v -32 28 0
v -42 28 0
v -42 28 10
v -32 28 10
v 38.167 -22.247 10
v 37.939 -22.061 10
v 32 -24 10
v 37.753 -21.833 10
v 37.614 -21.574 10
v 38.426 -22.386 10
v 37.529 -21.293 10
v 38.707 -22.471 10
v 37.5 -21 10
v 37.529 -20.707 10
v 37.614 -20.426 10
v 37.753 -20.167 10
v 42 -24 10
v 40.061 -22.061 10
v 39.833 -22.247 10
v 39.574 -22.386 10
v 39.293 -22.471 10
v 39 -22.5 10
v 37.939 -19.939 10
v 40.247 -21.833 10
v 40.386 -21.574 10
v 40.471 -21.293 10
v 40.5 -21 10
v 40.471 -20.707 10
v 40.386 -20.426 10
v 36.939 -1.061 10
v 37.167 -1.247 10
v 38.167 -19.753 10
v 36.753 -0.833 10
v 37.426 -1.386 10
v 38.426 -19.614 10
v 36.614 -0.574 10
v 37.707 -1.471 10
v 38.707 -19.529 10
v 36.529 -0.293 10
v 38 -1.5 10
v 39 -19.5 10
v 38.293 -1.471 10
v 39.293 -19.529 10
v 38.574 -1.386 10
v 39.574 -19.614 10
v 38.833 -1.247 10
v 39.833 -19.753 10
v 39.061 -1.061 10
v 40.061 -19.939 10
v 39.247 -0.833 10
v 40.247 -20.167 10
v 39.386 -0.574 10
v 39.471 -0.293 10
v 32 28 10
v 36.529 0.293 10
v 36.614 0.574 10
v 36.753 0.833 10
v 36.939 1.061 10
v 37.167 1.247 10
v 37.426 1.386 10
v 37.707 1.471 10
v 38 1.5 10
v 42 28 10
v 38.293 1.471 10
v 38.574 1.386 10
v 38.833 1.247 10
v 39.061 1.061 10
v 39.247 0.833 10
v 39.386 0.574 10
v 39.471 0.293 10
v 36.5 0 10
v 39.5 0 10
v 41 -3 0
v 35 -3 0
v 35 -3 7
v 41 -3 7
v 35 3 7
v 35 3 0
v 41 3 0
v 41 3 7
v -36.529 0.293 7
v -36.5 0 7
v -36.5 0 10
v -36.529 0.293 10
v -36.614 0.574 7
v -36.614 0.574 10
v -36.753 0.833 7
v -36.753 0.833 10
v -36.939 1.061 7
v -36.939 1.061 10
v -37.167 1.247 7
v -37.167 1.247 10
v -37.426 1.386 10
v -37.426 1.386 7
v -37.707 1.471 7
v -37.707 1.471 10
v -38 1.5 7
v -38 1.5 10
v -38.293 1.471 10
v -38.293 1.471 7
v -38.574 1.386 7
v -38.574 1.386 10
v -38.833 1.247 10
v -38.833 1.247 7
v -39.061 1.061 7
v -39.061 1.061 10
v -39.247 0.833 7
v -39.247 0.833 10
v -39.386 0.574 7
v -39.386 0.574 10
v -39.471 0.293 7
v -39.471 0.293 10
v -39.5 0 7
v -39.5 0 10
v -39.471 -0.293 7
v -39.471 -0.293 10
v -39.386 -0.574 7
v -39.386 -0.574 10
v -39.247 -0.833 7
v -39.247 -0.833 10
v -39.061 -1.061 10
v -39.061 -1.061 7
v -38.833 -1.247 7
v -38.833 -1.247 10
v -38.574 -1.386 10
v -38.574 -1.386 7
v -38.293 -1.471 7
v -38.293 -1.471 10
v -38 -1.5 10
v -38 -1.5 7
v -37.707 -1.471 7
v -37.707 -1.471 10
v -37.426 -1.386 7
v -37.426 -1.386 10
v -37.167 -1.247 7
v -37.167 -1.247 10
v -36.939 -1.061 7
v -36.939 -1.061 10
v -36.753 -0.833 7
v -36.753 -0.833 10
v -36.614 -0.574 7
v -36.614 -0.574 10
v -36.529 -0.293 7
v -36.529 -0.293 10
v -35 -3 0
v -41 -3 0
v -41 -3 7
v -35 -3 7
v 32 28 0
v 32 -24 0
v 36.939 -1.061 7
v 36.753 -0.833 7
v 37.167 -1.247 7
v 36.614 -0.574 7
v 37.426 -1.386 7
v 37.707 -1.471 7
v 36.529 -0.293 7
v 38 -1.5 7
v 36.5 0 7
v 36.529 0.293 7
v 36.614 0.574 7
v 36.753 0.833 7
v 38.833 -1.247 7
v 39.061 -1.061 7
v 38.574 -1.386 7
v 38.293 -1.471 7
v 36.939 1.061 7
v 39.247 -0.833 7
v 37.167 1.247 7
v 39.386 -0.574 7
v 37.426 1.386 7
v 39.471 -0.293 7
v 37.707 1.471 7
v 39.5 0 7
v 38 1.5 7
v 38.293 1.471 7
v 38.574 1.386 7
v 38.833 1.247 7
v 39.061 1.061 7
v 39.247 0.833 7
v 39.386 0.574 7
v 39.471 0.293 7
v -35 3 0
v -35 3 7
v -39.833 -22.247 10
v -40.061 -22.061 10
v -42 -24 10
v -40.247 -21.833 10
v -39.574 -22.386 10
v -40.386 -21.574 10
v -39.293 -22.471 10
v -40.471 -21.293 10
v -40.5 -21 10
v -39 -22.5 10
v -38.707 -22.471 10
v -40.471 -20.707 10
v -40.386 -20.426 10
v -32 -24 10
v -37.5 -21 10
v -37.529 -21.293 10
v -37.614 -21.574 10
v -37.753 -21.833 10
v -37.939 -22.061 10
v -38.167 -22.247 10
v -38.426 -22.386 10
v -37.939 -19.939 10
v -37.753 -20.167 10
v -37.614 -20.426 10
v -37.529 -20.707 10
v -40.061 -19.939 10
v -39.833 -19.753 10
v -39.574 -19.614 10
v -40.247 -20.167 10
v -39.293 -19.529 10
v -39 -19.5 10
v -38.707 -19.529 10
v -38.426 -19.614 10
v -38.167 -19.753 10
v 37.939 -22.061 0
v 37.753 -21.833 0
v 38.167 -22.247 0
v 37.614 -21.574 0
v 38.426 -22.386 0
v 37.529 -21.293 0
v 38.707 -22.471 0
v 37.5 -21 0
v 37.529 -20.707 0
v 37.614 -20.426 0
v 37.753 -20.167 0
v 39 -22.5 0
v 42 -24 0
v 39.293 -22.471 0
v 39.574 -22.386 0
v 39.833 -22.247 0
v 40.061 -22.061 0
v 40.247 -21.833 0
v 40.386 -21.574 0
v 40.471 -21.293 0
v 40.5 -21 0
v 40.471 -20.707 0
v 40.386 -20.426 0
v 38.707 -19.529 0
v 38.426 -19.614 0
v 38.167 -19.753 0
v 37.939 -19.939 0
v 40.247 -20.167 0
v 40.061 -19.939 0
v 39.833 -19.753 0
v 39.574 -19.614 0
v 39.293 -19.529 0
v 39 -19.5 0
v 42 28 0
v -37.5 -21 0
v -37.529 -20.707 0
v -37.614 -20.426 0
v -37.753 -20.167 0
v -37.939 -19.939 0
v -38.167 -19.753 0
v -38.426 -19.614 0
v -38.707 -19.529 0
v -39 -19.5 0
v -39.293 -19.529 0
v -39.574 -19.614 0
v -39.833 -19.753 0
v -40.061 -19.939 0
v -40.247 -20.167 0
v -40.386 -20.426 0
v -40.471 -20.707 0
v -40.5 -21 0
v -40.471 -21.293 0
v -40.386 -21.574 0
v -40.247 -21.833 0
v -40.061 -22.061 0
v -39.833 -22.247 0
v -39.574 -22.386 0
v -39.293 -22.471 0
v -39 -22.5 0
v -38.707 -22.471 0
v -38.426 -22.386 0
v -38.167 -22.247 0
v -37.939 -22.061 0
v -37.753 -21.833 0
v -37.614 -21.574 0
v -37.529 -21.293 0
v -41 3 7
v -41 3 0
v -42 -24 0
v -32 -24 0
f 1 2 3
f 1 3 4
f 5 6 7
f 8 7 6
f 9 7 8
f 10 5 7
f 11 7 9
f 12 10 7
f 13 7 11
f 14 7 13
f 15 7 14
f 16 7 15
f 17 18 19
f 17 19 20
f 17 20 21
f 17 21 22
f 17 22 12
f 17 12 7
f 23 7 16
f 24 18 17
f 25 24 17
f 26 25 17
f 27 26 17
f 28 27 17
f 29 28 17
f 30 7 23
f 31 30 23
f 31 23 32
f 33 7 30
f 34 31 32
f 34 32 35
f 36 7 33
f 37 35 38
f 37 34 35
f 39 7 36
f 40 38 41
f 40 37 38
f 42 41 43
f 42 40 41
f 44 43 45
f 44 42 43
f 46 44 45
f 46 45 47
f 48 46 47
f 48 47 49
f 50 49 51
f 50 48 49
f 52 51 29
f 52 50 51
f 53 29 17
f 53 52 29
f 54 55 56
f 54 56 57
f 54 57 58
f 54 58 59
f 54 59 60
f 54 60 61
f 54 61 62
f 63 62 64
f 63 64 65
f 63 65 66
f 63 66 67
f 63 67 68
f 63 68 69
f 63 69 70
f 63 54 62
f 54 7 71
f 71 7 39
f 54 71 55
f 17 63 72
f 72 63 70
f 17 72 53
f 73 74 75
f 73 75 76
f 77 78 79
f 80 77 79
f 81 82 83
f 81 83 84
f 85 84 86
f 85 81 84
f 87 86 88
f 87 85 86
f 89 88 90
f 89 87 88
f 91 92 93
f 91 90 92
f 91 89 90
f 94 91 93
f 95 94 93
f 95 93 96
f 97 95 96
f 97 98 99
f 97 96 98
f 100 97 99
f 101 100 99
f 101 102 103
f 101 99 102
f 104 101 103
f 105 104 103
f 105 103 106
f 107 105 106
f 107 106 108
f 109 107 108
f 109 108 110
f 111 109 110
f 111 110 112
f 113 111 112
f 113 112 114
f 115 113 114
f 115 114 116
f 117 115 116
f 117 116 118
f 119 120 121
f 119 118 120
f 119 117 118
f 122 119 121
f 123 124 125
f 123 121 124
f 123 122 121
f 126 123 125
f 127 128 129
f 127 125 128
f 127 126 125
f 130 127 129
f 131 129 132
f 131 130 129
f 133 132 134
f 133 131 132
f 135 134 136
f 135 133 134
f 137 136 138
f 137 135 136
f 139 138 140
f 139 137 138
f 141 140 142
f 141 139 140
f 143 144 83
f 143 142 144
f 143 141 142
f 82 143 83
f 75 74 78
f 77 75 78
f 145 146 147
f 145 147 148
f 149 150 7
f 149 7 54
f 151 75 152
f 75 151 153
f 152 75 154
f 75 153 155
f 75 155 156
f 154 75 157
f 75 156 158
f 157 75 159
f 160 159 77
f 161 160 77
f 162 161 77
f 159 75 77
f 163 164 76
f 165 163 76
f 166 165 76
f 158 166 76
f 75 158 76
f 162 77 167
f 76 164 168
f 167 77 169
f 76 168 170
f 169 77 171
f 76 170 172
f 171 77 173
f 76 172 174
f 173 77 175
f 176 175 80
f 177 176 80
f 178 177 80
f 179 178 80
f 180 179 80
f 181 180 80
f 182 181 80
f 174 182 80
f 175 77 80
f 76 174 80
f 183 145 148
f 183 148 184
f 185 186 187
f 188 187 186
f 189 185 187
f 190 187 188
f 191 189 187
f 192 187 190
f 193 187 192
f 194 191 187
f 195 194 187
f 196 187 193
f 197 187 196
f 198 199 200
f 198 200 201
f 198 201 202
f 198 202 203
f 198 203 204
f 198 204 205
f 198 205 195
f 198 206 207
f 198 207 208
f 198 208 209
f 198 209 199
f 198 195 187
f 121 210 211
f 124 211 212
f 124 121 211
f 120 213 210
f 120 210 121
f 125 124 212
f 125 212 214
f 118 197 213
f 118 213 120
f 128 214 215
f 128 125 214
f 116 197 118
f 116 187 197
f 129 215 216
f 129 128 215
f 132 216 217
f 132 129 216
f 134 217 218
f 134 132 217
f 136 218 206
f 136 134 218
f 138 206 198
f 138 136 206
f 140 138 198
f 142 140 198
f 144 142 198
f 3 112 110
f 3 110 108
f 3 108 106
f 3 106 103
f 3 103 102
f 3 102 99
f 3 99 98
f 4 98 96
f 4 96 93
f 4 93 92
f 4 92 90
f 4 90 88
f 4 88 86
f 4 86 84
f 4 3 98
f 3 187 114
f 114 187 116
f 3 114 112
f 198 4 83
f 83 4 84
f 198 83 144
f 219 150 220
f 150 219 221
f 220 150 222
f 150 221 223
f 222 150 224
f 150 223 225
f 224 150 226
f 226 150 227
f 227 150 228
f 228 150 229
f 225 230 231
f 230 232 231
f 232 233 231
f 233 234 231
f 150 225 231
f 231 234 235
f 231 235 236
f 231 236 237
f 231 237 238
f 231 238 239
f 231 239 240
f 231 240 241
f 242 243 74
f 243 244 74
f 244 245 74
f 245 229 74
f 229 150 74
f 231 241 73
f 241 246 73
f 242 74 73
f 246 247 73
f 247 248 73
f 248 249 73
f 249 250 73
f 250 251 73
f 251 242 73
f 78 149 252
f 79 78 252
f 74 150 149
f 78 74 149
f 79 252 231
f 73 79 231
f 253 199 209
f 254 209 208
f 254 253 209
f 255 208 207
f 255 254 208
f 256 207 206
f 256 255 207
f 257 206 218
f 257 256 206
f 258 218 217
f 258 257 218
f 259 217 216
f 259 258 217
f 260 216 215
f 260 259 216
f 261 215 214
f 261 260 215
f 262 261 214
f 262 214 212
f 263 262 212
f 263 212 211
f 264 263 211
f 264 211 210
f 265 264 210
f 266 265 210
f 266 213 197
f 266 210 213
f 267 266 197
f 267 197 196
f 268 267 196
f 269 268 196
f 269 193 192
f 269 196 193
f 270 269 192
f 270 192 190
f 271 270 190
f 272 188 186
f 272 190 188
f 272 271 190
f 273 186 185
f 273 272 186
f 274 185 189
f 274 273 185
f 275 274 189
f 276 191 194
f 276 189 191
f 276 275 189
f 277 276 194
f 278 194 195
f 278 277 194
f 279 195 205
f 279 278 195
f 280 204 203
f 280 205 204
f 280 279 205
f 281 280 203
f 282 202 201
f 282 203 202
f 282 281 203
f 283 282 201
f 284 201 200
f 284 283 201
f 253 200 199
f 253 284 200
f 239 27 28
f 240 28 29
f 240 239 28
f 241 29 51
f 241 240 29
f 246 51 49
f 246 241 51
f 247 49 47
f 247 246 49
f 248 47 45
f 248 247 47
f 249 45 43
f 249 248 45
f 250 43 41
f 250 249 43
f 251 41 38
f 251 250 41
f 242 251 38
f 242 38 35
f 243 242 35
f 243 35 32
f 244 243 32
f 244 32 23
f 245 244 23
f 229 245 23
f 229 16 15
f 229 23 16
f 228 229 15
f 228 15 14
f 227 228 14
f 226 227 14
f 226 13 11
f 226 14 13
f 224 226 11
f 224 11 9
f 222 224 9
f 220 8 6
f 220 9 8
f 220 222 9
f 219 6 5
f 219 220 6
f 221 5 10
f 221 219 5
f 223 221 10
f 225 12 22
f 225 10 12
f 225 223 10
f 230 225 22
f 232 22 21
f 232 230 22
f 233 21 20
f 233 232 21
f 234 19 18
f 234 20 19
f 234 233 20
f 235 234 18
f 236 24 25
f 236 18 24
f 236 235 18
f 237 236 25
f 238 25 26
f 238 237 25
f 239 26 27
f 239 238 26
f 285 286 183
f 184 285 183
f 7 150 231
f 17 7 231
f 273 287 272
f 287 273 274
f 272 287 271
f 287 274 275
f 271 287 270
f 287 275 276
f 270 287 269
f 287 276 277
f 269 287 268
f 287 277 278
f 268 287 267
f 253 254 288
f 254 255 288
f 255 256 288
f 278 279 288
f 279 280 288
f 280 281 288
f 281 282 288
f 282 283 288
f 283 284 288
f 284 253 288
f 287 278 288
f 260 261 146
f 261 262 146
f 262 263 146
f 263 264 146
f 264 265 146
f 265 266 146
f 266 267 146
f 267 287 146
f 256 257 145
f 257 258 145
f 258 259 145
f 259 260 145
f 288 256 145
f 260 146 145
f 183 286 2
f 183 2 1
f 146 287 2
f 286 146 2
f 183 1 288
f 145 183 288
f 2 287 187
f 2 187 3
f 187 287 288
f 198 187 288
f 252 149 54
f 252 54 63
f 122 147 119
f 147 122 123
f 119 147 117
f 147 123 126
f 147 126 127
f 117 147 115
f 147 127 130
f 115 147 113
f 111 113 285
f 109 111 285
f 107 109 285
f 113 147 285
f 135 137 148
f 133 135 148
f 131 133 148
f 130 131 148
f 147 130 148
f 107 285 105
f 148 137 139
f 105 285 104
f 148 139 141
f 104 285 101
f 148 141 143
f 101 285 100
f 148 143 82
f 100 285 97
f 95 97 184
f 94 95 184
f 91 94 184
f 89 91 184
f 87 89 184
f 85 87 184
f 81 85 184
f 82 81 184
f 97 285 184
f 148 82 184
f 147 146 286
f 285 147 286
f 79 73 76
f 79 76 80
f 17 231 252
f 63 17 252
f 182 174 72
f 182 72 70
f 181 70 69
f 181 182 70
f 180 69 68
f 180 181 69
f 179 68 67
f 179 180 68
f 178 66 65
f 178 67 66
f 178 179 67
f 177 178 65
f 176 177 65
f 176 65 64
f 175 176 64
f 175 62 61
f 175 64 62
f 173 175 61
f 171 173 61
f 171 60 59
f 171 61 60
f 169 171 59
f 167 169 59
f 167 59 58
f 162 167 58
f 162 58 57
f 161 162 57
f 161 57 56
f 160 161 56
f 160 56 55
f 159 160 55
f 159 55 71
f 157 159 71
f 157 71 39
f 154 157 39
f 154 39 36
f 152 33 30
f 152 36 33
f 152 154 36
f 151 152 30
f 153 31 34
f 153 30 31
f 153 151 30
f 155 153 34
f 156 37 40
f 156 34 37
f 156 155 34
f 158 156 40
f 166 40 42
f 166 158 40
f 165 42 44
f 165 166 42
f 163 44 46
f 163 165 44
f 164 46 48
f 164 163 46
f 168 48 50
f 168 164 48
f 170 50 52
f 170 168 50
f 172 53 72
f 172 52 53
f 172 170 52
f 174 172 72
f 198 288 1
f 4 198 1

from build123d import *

# Parameters (mm, degrees)
BOX239_W           = 6
BOX239_H           = 6
BOX239_DEPTH       = 64
BOX238_W           = 6
BOX238_H           = 6
BOX238_DEPTH       = 64
CYLINDER1263_R     = 1.5
CYLINDER1263_DEPTH = 32
CYLINDER1262_R     = 1.5
CYLINDER1262_DEPTH = 32
CYLINDER1261_R     = 1.5
CYLINDER1261_DEPTH = 100
CYLINDER1260_R     = 1.5
CYLINDER1260_DEPTH = 100
CYLINDER586_R      = 1.5
CYLINDER586_DEPTH  = 100
CYLINDER585_R      = 1.5
CYLINDER585_DEPTH  = 100
BOX141_W           = 10
BOX141_H           = 52
BOX141_DEPTH       = 10
BOX140_W           = 10
BOX140_H           = 52
BOX140_DEPTH       = 10


with BuildPart() as krychle239:
    # Box239 → Box239 (new body)
    with BuildSketch(Plane(origin=(87, -3, -93), x_dir=(1, 0, 0), z_dir=(0, 0, 1))):
        with Locations((3, 3)):
            Rectangle(BOX239_W, BOX239_H)
    extrude(amount=BOX239_DEPTH)


with BuildPart() as compound646:
    # Box238 → Box238 (new body)
    with BuildSketch(Plane(origin=(11, -3, -93), x_dir=(1, 0, 0), z_dir=(0, 0, 1))):
        with Locations((3, 3)):
            Rectangle(BOX238_W, BOX238_H)
    extrude(amount=BOX238_DEPTH)

    # Compound646: union Krychle239
    add(krychle239.part)


with BuildPart() as compound646_1:
    # Compound646 placement: moved
    add(compound646.part.moved(Location((-52, 0, 36))))


with BuildPart() as v_lec1263:
    # Cylinder1263 → Cylinder1263 (new body)
    with BuildSketch(Plane(origin=(78, 41, -42), x_dir=(1, 0, 0), z_dir=(0, 0, 1))):
        Circle(CYLINDER1263_R)
    extrude(amount=CYLINDER1263_DEPTH)


with BuildPart() as compound645:
    # Cylinder1262 → Cylinder1262 (new body)
    with BuildSketch(Plane(origin=(26, 41, -42), x_dir=(1, 0, 0), z_dir=(0, 0, 1))):
        Circle(CYLINDER1262_R)
    extrude(amount=CYLINDER1262_DEPTH)

    # Compound645: union Válec1263
    add(v_lec1263.part)


with BuildPart() as compound645_1:
    # Compound645 placement: moved
    add(compound645.part.moved(Location((-52, 0, 36))))


with BuildPart() as v_lec1261:
    # Cylinder1261 → Cylinder1261 (new body)
    with BuildSketch(Plane(origin=(14, 0, -60), x_dir=(1, 0, 0), z_dir=(0, 0, 1))):
        Circle(CYLINDER1261_R)
    extrude(amount=CYLINDER1261_DEPTH)


with BuildPart() as compound643:
    # Cylinder1260 → Cylinder1260 (new body)
    with BuildSketch(Plane(origin=(90, 0, -60), x_dir=(1, 0, 0), z_dir=(0, 0, 1))):
        Circle(CYLINDER1260_R)
    extrude(amount=CYLINDER1260_DEPTH)

    # Compound644: union Válec1261
    add(v_lec1261.part)


with BuildPart() as compound643_1:
    # Compound644 placement: moved
    add(compound643.part.moved(Location((-52, 0, 0))))

    # Compound643: union Compound645
    add(compound645_1.part)


with BuildPart() as v_lec586:
    # Cylinder586 → Cylinder586 (new body)
    with BuildSketch(Plane(origin=(39, -21, 0), x_dir=(1, 0, 0), z_dir=(0, 0, 1))):
        Circle(CYLINDER586_R)
    extrude(amount=CYLINDER586_DEPTH)


with BuildPart() as compound340:
    # Cylinder585 → Cylinder585 (new body)
    with BuildSketch(Plane(origin=(-39, -21, 0), x_dir=(1, 0, 0), z_dir=(0, 0, 1))):
        Circle(CYLINDER585_R)
    extrude(amount=CYLINDER585_DEPTH)

    # Compound340: union Válec586
    add(v_lec586.part)


with BuildPart() as krychle141:
    # Box141 → Box141 (new body)
    with BuildSketch(Plane(origin=(-42, -24, 0), x_dir=(1, 0, 0), z_dir=(0, 0, 1))):
        with Locations((5, 26)):
            Rectangle(BOX141_W, BOX141_H)
    extrude(amount=BOX141_DEPTH)


with BuildPart() as cut200:
    # Box140 → Box140 (new body)
    with BuildSketch(Plane(origin=(32, -24, 0), x_dir=(1, 0, 0), z_dir=(0, 0, 1))):
        with Locations((5, 26)):
            Rectangle(BOX140_W, BOX140_H)
    extrude(amount=BOX140_DEPTH)

    # Compound341: union Krychle141
    add(krychle141.part)

    # Cut173: cut Compound340
    add(compound340.part, mode=Mode.SUBTRACT)

    # Cut199: cut Compound643
    add(compound643_1.part, mode=Mode.SUBTRACT)

    # Cut200: cut Compound646
    add(compound646_1.part, mode=Mode.SUBTRACT)


solid = cut200.part
